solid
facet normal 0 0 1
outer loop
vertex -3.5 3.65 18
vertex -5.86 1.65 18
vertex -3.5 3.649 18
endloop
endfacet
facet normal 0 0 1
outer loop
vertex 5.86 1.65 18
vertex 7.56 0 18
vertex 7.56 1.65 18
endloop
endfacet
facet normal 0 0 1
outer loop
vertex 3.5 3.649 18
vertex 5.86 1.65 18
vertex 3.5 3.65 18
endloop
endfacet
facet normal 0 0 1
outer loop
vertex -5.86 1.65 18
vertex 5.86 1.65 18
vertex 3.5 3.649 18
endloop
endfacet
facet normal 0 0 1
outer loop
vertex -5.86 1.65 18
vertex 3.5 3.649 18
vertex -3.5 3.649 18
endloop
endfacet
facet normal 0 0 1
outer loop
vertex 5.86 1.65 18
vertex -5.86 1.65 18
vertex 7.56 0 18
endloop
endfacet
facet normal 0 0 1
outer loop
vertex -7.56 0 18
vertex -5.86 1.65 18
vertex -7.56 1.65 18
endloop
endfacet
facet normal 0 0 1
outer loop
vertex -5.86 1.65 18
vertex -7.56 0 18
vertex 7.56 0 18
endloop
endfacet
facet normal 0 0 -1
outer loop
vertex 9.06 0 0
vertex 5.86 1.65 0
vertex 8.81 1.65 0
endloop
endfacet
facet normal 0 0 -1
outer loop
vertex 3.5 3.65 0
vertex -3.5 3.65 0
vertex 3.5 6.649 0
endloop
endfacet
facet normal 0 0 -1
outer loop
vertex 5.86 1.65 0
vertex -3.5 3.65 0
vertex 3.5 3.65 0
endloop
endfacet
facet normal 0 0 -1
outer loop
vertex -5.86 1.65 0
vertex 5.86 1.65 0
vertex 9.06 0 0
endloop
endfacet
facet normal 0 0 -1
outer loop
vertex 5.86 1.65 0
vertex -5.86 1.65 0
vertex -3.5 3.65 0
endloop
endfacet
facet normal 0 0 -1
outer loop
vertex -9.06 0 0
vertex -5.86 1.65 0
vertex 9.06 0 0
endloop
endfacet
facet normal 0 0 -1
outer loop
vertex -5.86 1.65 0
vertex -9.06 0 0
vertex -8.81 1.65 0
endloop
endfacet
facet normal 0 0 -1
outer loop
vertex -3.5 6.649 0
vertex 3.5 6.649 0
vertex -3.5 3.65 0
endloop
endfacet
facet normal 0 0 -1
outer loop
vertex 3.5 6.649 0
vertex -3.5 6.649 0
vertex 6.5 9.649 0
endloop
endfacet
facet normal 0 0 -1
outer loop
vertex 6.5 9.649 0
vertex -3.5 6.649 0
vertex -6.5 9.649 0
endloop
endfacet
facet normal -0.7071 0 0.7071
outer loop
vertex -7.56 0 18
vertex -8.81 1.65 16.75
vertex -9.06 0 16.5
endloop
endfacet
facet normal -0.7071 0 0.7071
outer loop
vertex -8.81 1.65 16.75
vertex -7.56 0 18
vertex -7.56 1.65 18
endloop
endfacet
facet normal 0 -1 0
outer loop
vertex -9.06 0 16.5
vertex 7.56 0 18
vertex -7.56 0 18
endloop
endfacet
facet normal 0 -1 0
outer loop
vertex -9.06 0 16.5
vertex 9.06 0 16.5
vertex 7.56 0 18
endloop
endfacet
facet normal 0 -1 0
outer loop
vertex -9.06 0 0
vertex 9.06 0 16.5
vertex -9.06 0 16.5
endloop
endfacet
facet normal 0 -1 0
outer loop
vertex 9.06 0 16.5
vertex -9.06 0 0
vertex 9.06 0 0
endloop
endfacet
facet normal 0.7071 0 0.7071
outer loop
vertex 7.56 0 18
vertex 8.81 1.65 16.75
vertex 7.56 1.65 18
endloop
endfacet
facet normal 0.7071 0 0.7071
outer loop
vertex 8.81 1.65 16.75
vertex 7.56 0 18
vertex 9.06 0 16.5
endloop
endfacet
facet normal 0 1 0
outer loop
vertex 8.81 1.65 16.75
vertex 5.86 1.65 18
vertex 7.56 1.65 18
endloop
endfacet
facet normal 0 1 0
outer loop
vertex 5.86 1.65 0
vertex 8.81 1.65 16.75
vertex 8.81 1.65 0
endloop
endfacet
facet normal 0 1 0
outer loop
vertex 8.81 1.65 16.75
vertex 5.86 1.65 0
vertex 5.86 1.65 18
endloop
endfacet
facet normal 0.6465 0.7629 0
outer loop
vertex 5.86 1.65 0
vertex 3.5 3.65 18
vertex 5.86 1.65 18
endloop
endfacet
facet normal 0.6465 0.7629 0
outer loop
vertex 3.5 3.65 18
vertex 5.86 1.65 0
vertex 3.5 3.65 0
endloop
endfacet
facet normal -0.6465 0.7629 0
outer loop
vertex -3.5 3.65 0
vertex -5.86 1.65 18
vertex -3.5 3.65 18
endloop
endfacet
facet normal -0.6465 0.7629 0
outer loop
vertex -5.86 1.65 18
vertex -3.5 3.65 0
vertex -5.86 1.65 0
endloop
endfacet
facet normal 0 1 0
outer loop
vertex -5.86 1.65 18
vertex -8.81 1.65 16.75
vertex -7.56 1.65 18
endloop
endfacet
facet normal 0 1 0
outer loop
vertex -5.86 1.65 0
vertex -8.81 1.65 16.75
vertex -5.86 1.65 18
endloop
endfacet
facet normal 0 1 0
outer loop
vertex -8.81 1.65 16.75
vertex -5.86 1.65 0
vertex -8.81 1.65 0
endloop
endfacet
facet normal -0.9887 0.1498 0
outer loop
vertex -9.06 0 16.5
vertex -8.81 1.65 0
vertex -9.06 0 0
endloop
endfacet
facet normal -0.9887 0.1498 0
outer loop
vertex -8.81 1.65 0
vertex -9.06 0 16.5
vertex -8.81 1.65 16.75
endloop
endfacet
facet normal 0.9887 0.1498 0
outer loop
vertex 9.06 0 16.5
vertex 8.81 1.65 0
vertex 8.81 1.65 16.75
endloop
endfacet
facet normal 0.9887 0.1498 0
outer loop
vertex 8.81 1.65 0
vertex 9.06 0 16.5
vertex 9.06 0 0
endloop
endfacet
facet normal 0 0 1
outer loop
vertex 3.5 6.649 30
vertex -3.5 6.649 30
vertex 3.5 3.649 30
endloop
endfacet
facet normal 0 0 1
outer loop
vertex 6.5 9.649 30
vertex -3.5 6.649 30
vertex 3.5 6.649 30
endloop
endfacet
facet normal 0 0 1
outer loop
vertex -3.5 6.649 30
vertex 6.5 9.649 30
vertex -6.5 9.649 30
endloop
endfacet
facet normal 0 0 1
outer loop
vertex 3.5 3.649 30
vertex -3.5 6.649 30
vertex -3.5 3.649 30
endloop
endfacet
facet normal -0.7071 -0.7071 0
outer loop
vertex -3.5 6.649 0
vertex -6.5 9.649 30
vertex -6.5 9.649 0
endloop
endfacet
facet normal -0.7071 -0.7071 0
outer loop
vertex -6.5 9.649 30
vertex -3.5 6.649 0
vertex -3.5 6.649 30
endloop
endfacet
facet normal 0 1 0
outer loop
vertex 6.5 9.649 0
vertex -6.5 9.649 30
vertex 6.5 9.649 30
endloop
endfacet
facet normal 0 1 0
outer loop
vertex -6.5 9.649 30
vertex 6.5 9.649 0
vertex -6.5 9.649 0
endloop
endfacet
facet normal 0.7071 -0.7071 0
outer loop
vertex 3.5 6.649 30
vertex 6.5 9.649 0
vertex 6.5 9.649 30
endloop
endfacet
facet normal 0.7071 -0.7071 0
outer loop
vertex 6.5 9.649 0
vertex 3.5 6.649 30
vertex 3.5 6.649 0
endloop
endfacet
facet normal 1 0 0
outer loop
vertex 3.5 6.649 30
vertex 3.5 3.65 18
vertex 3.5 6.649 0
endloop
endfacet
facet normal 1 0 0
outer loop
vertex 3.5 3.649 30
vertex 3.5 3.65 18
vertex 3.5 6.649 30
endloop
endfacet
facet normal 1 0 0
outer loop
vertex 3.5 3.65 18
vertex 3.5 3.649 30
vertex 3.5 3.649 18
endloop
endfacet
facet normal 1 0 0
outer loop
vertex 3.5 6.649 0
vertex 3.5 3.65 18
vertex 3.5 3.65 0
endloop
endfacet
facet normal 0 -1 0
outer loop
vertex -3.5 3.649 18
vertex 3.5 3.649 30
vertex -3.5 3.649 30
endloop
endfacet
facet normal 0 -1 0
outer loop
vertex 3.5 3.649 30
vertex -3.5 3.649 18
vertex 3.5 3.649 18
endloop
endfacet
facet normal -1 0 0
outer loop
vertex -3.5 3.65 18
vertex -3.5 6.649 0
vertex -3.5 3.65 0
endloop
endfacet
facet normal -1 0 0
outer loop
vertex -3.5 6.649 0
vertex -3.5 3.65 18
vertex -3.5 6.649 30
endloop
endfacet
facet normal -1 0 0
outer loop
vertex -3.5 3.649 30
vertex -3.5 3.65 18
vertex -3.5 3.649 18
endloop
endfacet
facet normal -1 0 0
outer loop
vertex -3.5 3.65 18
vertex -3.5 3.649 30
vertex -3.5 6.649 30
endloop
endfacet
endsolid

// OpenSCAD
hotshoeWidthTolerance = 0.4;
hotshoeThicknessTolerance = 0.3;
   
mountOffset = 2;

dovetailWidth = 13;
dovetailHeight = 3;
dovetailStemHeight = 3;
dovetailLength = 30;// the full length dovetail would be 51;
holeSpacing = 18;
holeDiameter = 4.5;

module dummy() {}

hotshoeLength = 18;
hotshoeInset = 3.2;
hotshoeTaper = 0.25;
hotshoeCorner = 1.5;   
hotshoeWidth = 18.52-hotshoeWidthTolerance;
hotshoeThickness = 1.95-hotshoeThicknessTolerance;

nudge = 0.001;    

extraWidth = dovetailWidth - 2*dovetailHeight;

module daisyDovetail() {

    render(convexity=2)
    translate([0,0,dovetailStemHeight+dovetailHeight])
    rotate([0,180,0])
    rotate([90,0,0])
    linear_extrude(height=dovetailLength)
    polygon([ [-extraWidth/2,0], [-extraWidth/2,dovetailStemHeight], [-extraWidth/2-dovetailHeight,dovetailStemHeight+dovetailHeight], [extraWidth/2+dovetailHeight,dovetailStemHeight+dovetailHeight], [extraWidth/2,dovetailStemHeight], [extraWidth/2,0]]);
}
    
module hotshoe(coverStickout = 2) {    
hotshoeProfile = [
    [-hotshoeWidth/2, 0],
    [-hotshoeWidth/2+hotshoeTaper, hotshoeThickness],
    [-hotshoeWidth/2+hotshoeInset, hotshoeThickness],
    [-extraWidth/2, hotshoeThickness+coverStickout],
    [extraWidth/2, hotshoeThickness+coverStickout],
    [hotshoeWidth/2-hotshoeInset, hotshoeThickness],
    [hotshoeWidth/2-hotshoeTaper, hotshoeThickness],
    [hotshoeWidth/2, 0] ];

    render(convexity=1)
    intersection() {
        rotate([0,0,180])
        rotate([90,0,0])
        linear_extrude(height=hotshoeThickness+coverStickout)
        polygon([[-hotshoeWidth/2,0],
            [-hotshoeWidth/2,hotshoeLength-hotshoeCorner],
            [-hotshoeWidth/2+hotshoeCorner,hotshoeLength],
            [hotshoeWidth/2-hotshoeCorner,hotshoeLength],
            [hotshoeWidth/2,hotshoeLength-hotshoeCorner],
            [hotshoeWidth/2,0]]);

        linear_extrude(height=hotshoeLength) polygon(hotshoeProfile);
    }
}

render(convexity=3)
hotshoe(coverStickout = mountOffset);
translate([0,dovetailHeight+dovetailStemHeight+mountOffset+hotshoeThickness-nudge,dovetailLength])
rotate([90,0,0])
daisyDovetail();
